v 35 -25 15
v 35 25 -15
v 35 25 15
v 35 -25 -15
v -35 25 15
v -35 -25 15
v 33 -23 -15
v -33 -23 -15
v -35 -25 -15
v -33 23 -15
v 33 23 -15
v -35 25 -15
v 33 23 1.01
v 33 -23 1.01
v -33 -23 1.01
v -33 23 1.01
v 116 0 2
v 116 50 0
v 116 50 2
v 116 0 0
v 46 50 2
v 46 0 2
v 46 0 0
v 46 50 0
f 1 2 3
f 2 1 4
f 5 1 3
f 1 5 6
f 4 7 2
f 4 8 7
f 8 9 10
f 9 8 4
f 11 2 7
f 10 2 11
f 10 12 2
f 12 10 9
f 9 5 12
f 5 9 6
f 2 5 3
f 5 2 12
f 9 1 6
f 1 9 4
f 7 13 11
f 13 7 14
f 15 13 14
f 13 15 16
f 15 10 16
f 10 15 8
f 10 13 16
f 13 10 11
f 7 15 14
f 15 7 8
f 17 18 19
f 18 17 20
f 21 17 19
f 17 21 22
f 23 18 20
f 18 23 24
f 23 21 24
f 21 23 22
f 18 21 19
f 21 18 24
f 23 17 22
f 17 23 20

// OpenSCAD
// Dimensions for the enclosure parts
$fn = 64;

// Part 1: Box (main enclosure)
box_width = 70;
box_depth = 50;
box_height = 30;
wall_thickness = 2;
floor_thickness = 2;

// Part 2: Lid (printed upside down)
lid_plate_thickness = 2;
lip_thickness = 1.5;
lip_height = 4;
lip_outer_width = 65.6;
lip_outer_depth = 45.6;

// Spacing between parts
gap = 10;

// Center of box on X and Y
box_x_center = 0;
box_y_center = 0;

// Center of lid on X and Y (placed on +X side of box)
lid_x_center = box_width / 2 + gap + lid_plate_thickness / 2;
lid_y_center = 0;

// --- Box (Part 1) ---
// Outer box (solid)
box_outer = [box_width, box_depth, box_height];

// Inner cavity (to be removed from outer box)
box_inner = [
  box_width - 2 * wall_thickness,
  box_depth - 2 * wall_thickness,
  box_height - floor_thickness
];

// Create box with walls and floor
difference() {
  cube(box_outer, center = true);
  // Subtract inner cavity (with slight extension to ensure clean cut)
  translate([0, 0, -box_height / 2 + floor_thickness + 0.01]) {
    cube(box_inner, center = true);
  }
}

// --- Lid (Part 2) ---
// Lid plate (flat base)
translate([lid_x_center, lid_y_center, 0]) {
  // Plate lies on the bed (z = 0), so we place it at z = 0
  cube([box_width, box_depth, lid_plate_thickness], center = false);
}

// Lip (1.5 mm thick, 4 mm tall, centered on the plate)
// Outer lip dimensions (with 0.2 mm clearance on each side)
// So inner lip size is: 65.6 - 0.4 = 65.2 mm x 45.6 - 0.4 = 45.2 mm
// But we define lip as a rectangular wall around the inner area

// We'll create a rectangular wall (extruded from a rectangle) that forms the lip
// The lip is 1.5 mm thick and 4 mm high, sitting on top of the plate

// Define the lip's outer rectangle (65.6 x 45.6 mm) centered on the plate
lip_outer = [lip_outer_width, lip_outer_depth];
lip_inner = [
  lip_outer_width - 2 * lip_thickness,
  lip_outer_depth - 2 * lip_thickness
];

// Create lip as a rectangular wall (using difference between outer and inner rectangles)
// We'll use a 2D polygon for the lip profile and extrude it

translate([lid_x_center, lid_y_center, lid_plate_thickness]) {
  // Create a rectangular frame (lip) with outer size lip_outer, inner hole lip_inner
  difference() {
    // Outer rectangle (top face of lip)
    square(lip_outer, center = true);
    // Inner rectangle (hole to remove)
    translate([0, 0]) {
      square(lip_inner, center = true);
    }
  }
  // Extrude the lip profile upward (4 mm height)
  linear_extrude(lip_height) {
    // The 2D shape is already defined above
  }
}
